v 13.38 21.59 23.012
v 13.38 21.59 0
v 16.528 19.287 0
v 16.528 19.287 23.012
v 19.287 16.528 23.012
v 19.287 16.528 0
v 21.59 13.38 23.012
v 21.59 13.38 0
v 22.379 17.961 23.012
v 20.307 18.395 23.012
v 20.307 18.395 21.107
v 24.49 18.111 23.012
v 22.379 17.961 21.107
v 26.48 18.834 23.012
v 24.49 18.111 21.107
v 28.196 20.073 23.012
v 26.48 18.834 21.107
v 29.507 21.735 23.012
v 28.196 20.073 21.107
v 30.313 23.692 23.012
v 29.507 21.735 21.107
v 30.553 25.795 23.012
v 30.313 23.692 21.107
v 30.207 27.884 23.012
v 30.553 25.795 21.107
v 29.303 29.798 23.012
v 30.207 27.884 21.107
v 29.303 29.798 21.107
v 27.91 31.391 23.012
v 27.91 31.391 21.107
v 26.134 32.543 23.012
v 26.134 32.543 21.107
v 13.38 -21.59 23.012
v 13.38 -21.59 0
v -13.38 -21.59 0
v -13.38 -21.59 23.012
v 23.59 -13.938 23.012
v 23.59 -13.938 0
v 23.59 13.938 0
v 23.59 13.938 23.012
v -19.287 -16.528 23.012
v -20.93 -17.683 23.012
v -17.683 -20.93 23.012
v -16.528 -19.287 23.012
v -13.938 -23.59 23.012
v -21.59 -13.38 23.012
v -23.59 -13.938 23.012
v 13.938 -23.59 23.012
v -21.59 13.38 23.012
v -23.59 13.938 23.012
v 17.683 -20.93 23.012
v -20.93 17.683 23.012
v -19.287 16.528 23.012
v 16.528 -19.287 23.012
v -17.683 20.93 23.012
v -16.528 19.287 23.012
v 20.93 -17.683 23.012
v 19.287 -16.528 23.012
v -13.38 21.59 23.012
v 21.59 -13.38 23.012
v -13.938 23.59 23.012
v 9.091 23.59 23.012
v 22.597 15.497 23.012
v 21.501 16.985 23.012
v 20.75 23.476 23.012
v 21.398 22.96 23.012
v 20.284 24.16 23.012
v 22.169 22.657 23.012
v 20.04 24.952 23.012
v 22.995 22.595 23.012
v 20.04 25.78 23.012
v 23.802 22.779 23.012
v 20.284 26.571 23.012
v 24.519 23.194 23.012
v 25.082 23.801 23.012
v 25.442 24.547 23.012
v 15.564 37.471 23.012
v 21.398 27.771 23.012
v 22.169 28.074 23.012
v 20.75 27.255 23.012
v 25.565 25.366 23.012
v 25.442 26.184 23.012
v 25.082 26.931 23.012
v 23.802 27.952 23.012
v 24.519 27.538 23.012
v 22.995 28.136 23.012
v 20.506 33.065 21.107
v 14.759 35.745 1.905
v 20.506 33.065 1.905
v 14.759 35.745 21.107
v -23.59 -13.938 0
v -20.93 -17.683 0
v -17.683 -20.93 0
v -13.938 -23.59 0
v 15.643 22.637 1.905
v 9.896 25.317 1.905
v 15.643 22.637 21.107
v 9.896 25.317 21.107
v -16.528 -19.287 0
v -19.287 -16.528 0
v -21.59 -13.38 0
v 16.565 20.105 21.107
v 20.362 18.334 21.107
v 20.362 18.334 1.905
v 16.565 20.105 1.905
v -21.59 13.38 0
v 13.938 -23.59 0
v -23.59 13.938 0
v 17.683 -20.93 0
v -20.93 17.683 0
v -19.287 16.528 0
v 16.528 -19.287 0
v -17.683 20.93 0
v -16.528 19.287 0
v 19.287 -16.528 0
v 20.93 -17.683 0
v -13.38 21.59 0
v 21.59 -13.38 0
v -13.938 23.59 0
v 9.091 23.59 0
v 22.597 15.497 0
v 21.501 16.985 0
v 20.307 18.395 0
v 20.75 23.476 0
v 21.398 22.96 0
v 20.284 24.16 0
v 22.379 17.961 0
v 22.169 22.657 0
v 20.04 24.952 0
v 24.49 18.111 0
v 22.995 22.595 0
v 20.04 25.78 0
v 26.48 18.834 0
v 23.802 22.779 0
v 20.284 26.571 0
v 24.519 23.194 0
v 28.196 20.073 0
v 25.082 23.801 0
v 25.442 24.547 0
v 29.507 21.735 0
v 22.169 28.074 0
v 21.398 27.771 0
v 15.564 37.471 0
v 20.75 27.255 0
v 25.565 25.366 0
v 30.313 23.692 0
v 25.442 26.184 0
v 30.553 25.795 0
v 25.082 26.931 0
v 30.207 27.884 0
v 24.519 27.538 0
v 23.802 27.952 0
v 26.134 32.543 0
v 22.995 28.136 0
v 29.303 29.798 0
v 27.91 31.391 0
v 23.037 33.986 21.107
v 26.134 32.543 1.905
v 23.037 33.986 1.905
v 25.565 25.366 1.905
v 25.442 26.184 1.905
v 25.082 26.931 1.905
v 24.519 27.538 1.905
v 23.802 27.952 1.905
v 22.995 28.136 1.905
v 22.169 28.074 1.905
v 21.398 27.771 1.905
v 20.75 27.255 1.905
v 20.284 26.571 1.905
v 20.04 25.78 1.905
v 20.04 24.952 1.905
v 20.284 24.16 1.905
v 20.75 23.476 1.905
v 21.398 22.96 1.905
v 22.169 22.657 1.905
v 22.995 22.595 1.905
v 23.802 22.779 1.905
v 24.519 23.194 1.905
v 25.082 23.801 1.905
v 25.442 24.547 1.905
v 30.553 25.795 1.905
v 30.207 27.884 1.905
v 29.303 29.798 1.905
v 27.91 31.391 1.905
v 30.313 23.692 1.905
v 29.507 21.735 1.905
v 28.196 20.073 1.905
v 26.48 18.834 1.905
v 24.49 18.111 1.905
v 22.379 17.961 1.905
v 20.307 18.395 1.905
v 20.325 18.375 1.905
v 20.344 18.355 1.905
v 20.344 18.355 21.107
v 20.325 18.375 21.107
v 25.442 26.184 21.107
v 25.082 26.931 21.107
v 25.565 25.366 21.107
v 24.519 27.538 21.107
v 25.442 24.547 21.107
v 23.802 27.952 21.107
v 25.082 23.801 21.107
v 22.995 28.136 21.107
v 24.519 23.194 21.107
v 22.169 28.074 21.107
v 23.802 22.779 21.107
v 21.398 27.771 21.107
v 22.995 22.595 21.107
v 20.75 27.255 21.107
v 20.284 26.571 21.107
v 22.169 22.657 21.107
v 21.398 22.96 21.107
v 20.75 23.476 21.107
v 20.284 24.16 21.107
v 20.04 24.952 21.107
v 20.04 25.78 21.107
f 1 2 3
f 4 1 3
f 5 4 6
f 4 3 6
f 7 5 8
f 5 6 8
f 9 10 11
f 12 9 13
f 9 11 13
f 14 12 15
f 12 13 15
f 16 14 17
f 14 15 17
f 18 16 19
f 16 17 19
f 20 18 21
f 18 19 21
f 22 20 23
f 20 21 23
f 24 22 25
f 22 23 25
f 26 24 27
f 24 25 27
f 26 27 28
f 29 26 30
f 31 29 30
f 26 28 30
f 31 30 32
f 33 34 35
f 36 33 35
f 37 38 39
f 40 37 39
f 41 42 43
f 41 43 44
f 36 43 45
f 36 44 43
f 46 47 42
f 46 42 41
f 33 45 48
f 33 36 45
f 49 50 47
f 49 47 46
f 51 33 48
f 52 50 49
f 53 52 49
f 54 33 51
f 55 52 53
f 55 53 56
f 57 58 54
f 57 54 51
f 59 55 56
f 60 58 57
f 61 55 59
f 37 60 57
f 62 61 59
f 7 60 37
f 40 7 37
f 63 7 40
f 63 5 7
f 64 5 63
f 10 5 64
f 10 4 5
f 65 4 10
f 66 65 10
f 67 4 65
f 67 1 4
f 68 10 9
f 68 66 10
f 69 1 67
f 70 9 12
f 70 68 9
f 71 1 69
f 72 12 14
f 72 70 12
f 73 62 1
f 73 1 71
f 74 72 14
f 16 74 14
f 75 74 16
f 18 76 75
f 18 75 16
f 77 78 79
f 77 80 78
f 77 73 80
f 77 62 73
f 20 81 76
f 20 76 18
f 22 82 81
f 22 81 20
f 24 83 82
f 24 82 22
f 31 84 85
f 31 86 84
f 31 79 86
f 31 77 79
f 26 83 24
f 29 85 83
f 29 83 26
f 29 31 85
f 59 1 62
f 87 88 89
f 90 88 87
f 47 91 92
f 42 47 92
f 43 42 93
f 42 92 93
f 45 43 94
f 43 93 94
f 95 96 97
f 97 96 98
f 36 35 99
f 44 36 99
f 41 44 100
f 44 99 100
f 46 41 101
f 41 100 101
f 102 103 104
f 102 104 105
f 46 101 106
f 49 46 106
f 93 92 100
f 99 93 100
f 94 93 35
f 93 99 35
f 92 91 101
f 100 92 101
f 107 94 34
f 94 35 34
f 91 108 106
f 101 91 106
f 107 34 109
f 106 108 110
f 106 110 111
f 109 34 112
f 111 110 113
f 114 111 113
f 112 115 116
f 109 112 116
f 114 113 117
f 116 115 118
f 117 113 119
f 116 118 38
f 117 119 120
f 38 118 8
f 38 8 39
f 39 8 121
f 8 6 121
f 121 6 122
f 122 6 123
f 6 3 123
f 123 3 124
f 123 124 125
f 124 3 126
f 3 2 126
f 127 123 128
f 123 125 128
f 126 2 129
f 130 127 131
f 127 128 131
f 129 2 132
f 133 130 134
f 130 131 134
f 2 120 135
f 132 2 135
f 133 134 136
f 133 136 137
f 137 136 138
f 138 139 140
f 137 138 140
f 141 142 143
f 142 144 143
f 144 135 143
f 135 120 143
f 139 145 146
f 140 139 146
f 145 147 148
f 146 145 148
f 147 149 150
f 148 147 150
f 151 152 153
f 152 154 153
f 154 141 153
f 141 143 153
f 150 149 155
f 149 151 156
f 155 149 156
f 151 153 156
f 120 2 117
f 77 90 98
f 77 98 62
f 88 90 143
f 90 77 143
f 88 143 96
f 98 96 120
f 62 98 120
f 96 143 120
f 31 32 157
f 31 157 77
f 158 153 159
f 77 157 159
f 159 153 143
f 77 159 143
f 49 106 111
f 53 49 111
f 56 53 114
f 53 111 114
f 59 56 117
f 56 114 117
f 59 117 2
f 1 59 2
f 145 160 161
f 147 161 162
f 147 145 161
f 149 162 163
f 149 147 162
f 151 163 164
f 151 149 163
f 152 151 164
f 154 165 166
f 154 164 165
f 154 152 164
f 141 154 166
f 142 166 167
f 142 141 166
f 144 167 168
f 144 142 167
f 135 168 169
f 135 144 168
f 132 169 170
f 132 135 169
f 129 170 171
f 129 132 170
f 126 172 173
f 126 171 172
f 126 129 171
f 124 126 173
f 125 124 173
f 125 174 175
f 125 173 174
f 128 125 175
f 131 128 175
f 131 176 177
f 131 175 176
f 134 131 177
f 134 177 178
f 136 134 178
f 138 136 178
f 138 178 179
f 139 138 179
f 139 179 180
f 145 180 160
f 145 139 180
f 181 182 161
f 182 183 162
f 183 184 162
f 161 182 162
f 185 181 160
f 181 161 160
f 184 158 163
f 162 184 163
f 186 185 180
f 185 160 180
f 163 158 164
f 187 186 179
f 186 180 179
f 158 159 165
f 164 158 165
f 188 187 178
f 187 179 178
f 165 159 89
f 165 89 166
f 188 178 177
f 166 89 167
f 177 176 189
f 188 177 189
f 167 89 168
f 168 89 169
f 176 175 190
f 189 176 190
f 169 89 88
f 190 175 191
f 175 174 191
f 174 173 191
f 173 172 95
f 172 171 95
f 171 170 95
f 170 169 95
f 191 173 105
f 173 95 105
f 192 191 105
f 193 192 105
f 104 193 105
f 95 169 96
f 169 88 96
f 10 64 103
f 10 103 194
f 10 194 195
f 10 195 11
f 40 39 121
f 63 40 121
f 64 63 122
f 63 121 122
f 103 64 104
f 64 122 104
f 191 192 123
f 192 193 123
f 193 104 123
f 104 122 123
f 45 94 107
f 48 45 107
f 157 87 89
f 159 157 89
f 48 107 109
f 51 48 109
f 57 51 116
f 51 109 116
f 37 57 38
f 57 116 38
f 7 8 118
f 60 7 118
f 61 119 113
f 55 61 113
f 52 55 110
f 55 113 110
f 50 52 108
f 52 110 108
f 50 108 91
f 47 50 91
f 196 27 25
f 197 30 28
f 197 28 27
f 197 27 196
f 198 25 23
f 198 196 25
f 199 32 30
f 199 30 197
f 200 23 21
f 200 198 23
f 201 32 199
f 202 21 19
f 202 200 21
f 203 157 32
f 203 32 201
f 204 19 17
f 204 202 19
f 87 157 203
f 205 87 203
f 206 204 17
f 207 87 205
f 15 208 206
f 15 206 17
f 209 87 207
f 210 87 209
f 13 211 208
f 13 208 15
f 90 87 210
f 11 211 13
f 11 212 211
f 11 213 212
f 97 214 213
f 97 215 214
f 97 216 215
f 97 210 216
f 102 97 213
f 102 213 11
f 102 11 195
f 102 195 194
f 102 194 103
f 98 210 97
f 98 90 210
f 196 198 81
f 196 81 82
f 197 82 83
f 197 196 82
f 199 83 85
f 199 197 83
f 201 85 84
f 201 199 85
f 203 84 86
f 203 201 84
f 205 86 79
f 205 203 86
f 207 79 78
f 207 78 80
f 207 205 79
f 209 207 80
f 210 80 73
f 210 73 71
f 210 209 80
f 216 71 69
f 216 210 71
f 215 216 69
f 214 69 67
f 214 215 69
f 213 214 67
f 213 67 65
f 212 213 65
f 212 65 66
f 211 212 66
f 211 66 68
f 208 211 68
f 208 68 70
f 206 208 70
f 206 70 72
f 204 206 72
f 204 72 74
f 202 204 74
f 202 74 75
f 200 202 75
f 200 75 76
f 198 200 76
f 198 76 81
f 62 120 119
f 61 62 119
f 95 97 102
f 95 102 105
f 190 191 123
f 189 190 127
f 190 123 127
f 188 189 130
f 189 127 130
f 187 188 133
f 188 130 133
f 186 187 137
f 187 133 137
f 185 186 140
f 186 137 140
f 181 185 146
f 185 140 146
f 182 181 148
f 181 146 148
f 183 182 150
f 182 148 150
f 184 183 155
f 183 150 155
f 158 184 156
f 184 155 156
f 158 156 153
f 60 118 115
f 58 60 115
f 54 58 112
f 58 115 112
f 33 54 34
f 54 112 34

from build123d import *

# Parameters (mm, degrees)
F1_DEPTH = 23.0124
F2_R     = 2.778125
F3_DEPTH = 23.0124
F4_W     = 11.5062
F4_H     = 19.2024
F5_DEPTH = 39.3931387462
F6_W     = 11.0744
F6_H     = 19.2024
F7_DEPTH = 15.3162
F8_SIZE  = 1.90499


# Not quite as in the source:
# - a fillet or chamfer is up to 0.001 mm smaller than in the source, because OpenCascade refuses the exact size


with BuildPart() as f1:
    # F0 (on Top) → F1 (new body)
    with BuildSketch(Plane.XY):
        with BuildLine():
            Line((-13.9381455007, -23.59), (13.9381455007, -23.59))
            ThreePointArc((13.9381455007, -23.59), (19.3747258045, -19.3747258045), (23.59, -13.9381455007))
            Line((23.59, -13.9381455007), (23.59, 13.9381455007))
            ThreePointArc((23.59, 13.9381455007), (19.3747258045, 19.3747258045), (13.9381455007, 23.59))
            Line((13.9381455007, 23.59), (-13.9381455007, 23.59))
            ThreePointArc((-13.9381455007, 23.59), (-19.3747258045, 19.3747258045), (-23.59, 13.9381455007))
            Line((-23.59, 13.9381455007), (-23.59, -13.9381455007))
            ThreePointArc((-23.59, -13.9381455007), (-19.3747258045, -19.3747258045), (-13.9381455007, -23.59))
        make_face()
        with BuildLine():
            ThreePointArc((13.3802802661, 21.59), (17.9605122421, 17.9605122421), (21.59, 13.3802802661))
            Line((21.59, 13.3802802661), (21.59, -13.3802802661))
            ThreePointArc((21.59, -13.3802802661), (17.9605122421, -17.9605122421), (13.3802802661, -21.59))
            Line((13.3802802661, -21.59), (-13.3802802661, -21.59))
            ThreePointArc((-13.3802802661, -21.59), (-17.9605122421, -17.9605122421), (-21.59, -13.3802802661))
            Line((-21.59, -13.3802802661), (-21.59, 13.3802802661))
            ThreePointArc((-21.59, 13.3802802661), (-17.9605122421, 17.9605122421), (-13.3802802661, 21.59))
            Line((-13.3802802661, 21.59), (13.3802802661, 21.59))
        make_face(mode=Mode.SUBTRACT)
    extrude(amount=F1_DEPTH)

    # F2 (on Top) → F3 (join, through all)
    with BuildSketch(Plane.XY):
        with BuildLine():
            Line((15.5641722456, 37.4711913278), (9.0912664251, 23.59))
            Line((9.0912664251, 23.59), (19.6607342764, 18.6613761983))
            ThreePointArc((19.6607342764, 18.6613761983), (29.8377828505, 22.365518952), (26.1336400968, 32.5425675261))
            Line((26.1336400968, 32.5425675261), (15.5641722456, 37.4711913278))
        make_face()
        with Locations((22.7869465963, 25.3655601533)):
            Circle(F2_R, mode=Mode.SUBTRACT)
    extrude(amount=F3_DEPTH)

    # F4 (on face) → F5 (cut, through all)
    with BuildSketch(Plane(origin=(-1.5679842868, 0.7311630808, 0), x_dir=(-0.4226182617, -0.906307787, 0), z_dir=(-0.906307787, 0.4226182617, 0))):
        with Locations((-32.8800359098, 11.5062)):
            Rectangle(F4_W, F4_H)
    extrude(amount=-F5_DEPTH, mode=Mode.SUBTRACT)

    # F6 (on face) → F7 (cut)
    with BuildSketch(Plane(origin=(17.1321565324, 36.740028247, 0), x_dir=(-0.906307787, 0.4226182617, 0), z_dir=(0.4226182617, 0.906307787, 0))):
        with Locations((-12.0529382029, 11.5062)):
            Rectangle(F6_W, F6_H)
    extrude(amount=-F7_DEPTH, mode=Mode.SUBTRACT)

    # F8 (size 1.905 in the source; OpenCascade refuses exactly that, so slightly less here)
    f8_edges = [f1.edges().sort_by_distance(p)[0] for p in [
        (17.369603, 21.831683, 11.5062),
        (22.232333, 32.259842, 11.5062),
    ]]
    chamfer(f8_edges, length=F8_SIZE)


solid = f1.part
